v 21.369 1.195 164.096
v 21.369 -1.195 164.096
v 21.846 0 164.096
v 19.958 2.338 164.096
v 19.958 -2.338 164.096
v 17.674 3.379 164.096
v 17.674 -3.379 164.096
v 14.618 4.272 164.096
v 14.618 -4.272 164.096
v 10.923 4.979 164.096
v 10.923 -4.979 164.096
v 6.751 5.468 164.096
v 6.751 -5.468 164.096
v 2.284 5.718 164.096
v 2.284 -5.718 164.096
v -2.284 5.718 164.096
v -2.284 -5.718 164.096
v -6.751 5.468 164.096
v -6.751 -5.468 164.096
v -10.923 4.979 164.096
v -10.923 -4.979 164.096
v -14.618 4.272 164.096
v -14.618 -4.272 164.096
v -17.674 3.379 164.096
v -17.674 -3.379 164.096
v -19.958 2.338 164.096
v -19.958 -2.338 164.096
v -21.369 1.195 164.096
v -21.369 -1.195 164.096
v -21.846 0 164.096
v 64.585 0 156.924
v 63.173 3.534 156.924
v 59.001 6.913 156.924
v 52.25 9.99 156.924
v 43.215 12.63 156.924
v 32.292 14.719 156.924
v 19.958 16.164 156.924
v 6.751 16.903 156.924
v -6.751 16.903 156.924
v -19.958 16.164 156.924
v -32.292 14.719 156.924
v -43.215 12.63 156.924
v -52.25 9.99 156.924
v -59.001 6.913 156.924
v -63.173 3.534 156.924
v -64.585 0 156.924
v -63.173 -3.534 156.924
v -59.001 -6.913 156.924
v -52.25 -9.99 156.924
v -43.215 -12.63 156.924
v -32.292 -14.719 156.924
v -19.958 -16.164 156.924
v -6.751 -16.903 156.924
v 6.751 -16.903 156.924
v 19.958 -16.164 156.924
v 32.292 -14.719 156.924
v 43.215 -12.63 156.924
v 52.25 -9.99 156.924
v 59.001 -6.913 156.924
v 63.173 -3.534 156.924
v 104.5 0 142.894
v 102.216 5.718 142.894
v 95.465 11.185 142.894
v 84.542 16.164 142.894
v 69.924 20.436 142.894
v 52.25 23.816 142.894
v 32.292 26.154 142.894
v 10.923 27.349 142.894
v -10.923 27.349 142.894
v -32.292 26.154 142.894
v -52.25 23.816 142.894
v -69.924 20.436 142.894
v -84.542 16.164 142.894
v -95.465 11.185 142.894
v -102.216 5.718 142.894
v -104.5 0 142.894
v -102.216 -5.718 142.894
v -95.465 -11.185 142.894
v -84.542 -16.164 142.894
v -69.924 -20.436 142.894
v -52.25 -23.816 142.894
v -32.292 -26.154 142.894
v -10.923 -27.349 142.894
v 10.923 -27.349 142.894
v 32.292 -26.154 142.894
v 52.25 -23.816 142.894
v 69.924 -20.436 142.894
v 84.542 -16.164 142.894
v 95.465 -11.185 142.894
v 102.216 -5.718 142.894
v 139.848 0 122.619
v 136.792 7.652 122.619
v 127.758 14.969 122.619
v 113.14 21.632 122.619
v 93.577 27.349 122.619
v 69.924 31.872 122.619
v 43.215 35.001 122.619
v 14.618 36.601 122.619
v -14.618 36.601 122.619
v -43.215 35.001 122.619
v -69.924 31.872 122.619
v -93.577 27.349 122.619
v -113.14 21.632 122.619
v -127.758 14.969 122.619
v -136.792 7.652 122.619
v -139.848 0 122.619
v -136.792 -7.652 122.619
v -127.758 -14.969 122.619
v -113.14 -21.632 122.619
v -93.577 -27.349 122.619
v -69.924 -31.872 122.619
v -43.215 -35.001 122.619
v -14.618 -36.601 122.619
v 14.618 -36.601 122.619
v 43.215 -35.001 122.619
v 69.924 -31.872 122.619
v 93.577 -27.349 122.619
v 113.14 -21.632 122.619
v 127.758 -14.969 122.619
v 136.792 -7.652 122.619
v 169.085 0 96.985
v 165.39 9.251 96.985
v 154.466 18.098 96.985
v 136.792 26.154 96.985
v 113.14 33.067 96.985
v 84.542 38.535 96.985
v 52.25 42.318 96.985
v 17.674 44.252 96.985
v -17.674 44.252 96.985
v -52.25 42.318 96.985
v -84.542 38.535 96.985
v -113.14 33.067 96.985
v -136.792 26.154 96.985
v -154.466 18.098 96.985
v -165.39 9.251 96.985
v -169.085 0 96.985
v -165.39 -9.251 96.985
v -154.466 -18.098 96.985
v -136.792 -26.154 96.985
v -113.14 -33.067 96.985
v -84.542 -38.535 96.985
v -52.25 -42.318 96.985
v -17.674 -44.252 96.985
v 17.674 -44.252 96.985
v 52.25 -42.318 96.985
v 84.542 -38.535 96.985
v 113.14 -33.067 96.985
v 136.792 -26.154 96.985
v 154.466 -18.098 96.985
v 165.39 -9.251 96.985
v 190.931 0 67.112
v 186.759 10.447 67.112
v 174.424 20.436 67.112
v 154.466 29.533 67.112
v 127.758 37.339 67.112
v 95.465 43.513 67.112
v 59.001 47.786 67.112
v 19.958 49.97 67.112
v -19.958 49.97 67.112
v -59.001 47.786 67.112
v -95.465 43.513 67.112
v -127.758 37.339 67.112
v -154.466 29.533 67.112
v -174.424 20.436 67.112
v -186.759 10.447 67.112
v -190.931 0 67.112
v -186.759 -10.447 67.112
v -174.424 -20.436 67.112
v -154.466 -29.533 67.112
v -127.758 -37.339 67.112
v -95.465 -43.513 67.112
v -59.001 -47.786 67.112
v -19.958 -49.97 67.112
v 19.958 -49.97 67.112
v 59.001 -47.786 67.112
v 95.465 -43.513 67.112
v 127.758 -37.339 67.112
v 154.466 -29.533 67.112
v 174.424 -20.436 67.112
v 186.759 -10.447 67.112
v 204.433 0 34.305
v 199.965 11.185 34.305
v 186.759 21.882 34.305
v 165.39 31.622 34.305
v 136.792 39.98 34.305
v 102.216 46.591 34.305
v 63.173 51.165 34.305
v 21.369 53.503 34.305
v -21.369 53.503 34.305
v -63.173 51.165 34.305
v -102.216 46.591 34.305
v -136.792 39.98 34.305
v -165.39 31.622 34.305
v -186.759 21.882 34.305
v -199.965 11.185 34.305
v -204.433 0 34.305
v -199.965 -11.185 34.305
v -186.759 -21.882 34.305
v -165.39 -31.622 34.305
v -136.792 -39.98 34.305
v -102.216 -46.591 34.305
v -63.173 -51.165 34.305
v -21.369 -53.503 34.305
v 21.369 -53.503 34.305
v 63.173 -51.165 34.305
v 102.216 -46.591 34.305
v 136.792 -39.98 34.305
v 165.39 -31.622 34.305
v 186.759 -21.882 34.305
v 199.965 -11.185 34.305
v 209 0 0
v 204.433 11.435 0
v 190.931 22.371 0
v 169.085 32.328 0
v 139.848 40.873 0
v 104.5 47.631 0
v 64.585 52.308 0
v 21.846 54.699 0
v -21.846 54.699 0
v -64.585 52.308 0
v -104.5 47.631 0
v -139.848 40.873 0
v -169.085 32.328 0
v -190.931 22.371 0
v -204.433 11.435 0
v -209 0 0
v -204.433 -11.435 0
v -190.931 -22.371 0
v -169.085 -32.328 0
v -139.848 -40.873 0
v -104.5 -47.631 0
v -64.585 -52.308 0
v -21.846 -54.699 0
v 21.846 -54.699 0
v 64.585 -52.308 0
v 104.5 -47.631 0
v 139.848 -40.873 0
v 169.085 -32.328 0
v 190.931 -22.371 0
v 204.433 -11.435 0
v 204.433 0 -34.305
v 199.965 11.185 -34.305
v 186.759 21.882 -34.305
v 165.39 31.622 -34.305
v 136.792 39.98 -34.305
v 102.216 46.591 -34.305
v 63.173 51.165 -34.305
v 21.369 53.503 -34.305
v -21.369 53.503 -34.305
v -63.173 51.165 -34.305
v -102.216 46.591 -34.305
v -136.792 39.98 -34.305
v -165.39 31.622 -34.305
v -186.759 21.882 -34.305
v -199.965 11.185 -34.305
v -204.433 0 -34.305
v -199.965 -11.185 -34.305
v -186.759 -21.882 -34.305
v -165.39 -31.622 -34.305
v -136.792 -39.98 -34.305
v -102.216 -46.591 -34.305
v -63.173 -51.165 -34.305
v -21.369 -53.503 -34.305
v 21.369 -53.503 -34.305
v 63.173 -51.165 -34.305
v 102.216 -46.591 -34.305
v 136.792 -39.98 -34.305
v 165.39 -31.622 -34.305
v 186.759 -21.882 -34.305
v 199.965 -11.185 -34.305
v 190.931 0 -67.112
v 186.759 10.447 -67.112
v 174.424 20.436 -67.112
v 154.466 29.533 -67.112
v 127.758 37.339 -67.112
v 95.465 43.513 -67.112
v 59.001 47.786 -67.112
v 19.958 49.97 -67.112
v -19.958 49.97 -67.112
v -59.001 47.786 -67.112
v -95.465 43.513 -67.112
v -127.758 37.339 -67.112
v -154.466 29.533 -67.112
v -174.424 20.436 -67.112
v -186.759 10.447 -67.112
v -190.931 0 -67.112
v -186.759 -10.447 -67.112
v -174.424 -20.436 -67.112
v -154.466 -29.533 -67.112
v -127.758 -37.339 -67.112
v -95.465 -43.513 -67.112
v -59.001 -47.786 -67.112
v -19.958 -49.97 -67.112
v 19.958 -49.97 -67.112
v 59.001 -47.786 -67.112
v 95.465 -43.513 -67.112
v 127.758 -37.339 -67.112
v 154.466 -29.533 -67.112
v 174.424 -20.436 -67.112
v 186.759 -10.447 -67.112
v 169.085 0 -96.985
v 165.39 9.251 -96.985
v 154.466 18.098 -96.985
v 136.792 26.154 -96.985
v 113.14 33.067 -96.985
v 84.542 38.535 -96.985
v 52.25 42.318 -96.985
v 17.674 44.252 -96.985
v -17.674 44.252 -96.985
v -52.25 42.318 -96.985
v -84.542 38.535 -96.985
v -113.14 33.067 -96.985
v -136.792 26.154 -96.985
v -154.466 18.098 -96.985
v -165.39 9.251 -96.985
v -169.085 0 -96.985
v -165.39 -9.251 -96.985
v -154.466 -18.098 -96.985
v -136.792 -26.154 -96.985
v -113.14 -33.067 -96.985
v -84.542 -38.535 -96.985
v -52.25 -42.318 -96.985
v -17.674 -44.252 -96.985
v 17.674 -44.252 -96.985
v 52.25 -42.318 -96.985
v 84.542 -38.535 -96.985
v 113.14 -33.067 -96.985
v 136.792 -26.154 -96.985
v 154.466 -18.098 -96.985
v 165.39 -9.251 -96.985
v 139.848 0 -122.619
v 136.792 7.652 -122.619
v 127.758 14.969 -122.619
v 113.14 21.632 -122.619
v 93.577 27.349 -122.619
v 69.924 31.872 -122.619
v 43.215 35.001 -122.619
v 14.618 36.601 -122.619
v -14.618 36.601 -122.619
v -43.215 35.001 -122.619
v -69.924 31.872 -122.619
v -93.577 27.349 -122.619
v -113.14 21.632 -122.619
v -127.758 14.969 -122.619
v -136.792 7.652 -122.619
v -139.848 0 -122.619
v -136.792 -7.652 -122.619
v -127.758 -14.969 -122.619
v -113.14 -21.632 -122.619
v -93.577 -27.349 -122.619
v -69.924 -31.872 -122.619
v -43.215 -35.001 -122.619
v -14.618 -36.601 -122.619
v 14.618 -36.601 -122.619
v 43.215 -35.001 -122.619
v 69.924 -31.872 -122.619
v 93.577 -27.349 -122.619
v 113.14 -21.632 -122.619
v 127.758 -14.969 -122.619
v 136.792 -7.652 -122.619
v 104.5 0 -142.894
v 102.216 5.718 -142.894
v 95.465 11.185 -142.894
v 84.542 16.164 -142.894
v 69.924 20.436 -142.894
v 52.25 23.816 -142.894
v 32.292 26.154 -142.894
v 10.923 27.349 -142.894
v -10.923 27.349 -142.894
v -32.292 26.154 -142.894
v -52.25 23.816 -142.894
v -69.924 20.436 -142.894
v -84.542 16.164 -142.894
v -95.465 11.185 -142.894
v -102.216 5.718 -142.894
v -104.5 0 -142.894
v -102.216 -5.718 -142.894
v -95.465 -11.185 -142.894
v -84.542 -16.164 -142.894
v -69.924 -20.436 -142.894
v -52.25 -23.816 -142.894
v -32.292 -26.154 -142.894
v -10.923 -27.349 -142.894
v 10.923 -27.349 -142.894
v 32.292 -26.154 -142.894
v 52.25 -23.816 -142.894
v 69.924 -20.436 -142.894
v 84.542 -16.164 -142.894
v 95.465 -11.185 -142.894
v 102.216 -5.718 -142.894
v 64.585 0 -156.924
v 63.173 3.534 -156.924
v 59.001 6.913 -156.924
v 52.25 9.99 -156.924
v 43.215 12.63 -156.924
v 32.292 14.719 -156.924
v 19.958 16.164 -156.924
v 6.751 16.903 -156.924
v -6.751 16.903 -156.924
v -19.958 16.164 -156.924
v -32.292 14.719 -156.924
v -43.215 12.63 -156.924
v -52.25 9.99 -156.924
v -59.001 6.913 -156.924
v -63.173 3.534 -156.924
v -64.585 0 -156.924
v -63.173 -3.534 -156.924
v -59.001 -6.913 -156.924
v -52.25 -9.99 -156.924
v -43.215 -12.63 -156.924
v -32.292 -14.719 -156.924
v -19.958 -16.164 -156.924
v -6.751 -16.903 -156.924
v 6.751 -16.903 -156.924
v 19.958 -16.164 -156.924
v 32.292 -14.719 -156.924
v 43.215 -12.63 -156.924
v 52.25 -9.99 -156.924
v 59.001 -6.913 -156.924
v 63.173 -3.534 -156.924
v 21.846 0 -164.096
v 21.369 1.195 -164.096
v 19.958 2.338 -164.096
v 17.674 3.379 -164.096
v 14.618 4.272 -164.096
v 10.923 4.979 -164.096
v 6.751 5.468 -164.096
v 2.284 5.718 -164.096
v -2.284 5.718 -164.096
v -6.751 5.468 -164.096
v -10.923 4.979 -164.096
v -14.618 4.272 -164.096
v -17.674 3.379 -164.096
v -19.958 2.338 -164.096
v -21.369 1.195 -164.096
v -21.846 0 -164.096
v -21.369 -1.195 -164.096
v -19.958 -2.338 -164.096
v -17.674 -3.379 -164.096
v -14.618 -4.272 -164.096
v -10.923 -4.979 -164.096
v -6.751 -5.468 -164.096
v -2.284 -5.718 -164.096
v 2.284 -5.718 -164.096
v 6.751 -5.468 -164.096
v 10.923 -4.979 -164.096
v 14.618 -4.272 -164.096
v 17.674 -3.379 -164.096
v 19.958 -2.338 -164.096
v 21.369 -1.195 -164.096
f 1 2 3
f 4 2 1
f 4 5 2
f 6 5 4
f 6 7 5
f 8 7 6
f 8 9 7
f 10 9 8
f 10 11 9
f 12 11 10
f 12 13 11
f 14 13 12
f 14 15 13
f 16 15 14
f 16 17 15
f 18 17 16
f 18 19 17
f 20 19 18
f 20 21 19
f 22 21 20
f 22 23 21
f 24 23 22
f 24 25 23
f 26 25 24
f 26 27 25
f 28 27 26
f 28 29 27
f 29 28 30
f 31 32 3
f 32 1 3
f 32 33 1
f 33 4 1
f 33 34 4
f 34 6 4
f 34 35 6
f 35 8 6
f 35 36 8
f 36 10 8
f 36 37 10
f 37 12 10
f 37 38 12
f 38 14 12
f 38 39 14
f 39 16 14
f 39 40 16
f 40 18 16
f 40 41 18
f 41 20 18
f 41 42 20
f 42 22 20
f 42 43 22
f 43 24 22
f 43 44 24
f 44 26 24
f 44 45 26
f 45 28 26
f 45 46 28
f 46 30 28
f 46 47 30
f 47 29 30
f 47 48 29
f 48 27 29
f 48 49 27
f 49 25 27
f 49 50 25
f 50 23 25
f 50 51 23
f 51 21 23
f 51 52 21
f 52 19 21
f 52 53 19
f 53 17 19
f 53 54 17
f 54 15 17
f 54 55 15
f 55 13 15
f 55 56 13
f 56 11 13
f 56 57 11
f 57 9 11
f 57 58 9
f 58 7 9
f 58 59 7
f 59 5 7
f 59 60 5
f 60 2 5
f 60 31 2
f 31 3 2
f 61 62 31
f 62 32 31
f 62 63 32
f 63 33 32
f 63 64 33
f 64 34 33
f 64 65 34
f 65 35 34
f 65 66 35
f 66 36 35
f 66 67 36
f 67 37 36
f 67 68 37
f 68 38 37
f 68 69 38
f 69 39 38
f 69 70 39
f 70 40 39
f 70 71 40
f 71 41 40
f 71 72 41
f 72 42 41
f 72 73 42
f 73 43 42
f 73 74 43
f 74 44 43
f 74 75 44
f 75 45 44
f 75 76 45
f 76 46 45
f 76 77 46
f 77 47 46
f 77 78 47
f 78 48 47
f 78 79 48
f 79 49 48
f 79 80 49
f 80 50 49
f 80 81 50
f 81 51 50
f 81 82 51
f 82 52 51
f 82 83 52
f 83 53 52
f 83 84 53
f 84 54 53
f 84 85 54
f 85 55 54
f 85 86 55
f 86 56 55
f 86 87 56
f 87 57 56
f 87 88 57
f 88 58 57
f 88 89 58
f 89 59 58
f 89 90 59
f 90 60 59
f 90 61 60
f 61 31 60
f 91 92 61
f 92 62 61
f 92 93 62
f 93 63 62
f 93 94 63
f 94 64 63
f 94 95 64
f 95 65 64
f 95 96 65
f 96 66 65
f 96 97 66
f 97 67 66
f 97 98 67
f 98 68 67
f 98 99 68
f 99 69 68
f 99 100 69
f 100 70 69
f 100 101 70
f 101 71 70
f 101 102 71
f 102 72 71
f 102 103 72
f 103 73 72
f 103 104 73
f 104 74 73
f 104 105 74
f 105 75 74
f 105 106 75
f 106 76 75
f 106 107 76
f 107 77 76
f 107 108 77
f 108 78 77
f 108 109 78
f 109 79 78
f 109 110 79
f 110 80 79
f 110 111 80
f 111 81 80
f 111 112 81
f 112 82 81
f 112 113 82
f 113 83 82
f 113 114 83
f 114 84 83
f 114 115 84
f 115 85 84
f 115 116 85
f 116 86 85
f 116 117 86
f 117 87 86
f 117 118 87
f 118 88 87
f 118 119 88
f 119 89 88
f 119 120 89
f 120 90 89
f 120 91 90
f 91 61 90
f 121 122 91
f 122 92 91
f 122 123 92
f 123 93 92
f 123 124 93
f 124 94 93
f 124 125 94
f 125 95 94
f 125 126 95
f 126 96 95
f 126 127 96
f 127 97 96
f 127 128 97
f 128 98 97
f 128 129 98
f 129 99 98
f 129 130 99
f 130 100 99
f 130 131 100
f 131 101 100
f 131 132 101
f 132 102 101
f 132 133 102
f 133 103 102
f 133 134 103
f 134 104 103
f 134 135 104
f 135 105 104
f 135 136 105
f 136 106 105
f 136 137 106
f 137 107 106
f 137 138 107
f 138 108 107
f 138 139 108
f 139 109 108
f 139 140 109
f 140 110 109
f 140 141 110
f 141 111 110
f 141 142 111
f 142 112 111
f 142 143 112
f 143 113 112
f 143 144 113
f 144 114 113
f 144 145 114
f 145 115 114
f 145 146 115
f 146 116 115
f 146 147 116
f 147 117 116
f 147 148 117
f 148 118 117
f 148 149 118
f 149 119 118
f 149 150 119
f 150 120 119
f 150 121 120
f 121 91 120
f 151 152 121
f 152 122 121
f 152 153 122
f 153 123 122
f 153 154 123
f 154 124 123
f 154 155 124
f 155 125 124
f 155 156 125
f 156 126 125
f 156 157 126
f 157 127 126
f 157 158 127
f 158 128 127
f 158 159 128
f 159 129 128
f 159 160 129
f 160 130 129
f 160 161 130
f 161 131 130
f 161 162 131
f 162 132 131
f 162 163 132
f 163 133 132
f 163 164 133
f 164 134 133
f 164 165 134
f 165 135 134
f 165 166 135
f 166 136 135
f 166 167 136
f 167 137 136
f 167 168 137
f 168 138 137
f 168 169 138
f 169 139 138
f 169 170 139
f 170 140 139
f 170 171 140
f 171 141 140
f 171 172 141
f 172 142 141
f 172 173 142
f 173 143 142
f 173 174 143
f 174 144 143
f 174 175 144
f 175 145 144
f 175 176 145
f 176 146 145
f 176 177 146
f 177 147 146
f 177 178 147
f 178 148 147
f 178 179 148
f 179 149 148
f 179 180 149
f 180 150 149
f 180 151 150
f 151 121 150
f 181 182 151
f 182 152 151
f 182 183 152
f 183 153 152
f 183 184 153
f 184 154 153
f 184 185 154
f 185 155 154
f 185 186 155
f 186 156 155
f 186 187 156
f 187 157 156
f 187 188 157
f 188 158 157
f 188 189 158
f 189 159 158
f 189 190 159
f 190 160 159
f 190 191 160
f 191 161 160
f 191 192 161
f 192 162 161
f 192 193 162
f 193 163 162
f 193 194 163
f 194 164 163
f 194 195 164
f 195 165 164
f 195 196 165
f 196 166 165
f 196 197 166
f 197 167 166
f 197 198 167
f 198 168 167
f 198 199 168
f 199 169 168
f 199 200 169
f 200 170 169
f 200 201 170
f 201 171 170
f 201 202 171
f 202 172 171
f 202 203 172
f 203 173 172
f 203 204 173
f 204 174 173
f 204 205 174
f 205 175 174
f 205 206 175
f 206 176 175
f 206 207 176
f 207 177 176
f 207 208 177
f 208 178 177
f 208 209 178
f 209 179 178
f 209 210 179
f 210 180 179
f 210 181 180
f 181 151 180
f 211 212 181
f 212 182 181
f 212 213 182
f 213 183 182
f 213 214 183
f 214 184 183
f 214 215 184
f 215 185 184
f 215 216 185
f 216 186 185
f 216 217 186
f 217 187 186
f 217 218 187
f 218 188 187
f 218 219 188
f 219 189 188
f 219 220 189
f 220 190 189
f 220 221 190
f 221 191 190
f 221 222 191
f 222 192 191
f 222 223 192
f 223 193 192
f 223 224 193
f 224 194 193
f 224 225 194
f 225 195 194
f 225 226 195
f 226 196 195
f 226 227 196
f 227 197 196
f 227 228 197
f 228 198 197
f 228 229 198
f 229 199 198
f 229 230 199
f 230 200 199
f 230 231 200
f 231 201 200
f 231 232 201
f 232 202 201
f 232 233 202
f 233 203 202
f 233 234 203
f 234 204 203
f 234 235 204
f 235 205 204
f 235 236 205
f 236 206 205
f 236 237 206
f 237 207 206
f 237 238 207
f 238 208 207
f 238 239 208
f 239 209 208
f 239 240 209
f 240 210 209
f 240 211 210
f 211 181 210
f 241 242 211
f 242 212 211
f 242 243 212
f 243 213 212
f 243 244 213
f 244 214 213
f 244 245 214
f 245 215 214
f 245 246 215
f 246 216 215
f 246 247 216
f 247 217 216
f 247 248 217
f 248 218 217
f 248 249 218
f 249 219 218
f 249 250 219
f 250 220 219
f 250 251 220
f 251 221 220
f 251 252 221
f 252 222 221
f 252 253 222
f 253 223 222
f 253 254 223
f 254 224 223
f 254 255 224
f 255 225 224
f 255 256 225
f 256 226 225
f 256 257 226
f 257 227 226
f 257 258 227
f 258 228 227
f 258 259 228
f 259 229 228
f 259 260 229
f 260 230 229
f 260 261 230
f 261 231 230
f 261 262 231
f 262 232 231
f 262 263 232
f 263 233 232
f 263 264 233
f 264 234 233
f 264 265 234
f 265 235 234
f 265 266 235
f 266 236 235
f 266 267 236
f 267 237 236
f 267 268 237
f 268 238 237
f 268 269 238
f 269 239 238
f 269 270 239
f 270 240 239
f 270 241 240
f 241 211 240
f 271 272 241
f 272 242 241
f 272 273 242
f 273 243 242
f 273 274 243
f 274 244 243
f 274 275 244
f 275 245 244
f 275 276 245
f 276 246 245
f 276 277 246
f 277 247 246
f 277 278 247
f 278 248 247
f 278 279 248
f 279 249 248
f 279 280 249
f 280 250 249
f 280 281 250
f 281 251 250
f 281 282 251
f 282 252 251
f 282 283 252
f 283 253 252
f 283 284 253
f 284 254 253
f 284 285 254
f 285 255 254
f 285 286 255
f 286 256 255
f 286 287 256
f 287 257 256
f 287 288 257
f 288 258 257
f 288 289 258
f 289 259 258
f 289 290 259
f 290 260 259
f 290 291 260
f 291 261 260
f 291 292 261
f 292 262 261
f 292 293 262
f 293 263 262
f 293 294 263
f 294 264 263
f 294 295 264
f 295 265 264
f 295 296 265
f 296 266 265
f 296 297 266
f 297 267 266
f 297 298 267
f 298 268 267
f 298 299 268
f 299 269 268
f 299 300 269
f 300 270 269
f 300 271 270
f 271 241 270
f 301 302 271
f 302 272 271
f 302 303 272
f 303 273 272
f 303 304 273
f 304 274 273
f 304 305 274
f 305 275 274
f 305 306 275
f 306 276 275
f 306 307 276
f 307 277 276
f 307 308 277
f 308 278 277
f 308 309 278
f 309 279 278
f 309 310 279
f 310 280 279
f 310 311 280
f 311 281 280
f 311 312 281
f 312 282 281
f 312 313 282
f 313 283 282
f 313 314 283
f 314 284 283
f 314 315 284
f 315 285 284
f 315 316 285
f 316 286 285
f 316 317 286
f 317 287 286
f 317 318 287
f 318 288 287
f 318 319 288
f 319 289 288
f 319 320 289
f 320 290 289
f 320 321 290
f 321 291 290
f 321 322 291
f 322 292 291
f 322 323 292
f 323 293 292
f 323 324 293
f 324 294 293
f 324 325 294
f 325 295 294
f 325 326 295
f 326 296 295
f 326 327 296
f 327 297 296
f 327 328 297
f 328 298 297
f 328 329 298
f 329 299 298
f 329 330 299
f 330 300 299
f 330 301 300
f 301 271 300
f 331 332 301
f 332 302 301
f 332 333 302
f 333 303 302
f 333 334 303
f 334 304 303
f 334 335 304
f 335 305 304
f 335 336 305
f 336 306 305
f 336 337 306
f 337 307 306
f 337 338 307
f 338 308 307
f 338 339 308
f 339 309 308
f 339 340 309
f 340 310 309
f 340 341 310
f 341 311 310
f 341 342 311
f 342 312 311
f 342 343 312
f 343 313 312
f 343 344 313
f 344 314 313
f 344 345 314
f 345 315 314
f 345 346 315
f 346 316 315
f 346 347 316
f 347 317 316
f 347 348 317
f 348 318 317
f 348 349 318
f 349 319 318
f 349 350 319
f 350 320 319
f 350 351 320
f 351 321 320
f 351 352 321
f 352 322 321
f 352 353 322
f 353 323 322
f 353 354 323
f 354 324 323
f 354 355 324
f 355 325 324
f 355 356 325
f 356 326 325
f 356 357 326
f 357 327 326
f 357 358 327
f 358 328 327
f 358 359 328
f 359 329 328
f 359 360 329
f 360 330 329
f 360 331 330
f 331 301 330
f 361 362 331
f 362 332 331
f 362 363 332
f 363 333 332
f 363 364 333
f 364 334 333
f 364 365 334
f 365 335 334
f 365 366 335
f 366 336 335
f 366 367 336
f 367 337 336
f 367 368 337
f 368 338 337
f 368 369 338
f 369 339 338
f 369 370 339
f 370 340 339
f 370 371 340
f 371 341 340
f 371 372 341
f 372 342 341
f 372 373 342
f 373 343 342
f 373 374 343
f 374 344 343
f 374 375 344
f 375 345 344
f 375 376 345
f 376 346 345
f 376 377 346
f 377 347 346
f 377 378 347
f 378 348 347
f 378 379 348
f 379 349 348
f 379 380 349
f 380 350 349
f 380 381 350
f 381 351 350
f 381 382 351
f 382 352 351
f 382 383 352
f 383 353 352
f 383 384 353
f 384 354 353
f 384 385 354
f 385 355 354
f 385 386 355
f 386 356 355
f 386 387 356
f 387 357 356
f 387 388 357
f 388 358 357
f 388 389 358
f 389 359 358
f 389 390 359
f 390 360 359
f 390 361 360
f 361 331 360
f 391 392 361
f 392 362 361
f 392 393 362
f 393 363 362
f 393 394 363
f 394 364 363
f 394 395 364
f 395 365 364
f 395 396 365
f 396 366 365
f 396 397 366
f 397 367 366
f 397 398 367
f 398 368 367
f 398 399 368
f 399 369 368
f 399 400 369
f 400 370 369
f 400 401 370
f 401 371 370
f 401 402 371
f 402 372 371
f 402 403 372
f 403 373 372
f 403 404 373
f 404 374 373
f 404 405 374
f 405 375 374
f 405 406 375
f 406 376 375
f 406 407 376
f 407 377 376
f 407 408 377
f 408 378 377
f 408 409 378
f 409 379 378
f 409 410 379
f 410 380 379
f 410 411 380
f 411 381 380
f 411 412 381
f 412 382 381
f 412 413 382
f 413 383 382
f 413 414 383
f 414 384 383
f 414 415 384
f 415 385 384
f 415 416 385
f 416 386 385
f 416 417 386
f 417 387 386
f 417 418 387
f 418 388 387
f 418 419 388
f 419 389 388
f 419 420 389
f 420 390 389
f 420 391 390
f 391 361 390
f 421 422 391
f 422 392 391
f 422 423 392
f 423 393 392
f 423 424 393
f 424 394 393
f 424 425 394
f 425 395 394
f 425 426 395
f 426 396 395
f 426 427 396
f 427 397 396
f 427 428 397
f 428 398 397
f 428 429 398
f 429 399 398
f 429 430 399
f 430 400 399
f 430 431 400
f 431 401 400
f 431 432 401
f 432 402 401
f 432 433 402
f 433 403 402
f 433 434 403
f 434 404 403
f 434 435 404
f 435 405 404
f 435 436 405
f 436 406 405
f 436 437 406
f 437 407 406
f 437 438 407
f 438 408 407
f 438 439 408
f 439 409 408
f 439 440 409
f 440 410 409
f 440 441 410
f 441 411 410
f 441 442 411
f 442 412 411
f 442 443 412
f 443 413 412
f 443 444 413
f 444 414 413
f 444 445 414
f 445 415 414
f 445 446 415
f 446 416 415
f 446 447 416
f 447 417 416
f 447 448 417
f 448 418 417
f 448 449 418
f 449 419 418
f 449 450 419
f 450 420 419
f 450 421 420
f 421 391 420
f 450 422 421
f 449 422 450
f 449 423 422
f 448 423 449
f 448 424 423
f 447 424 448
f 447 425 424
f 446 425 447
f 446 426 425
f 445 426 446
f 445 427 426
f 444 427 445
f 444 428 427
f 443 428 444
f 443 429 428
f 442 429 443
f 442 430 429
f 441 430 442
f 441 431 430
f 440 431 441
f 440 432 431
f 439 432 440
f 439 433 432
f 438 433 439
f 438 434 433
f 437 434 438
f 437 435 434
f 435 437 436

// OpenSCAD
// Generated by SolidPython 1.0.1 on 2020-07-29 00:46:53


scale(v = [19, 5, 15]) {
	sphere(r = 11);
}
/***********************************************
*********      SolidPython code:      **********
************************************************
 
# import packages: SolidPython
from solid import *
from solid.utils import *
from itertools import chain, combinations, permutations


class Resize:

    def __init__(self, scad_file):
        self.scad_file = scad_file
        #self.scad_file = import_scad(scad_file)
        # cone/cylinder param:
        self.r1 = 0
        self.r2 = 0
        self.h = 0
        # rectangular prism param:
        self.w = 0
        self.l = 0
        # ellipse param:
        self.r = 0

    # import OpenScad code (file name corresponds to shape)


    # classify shape + parameters
    def assign(self, param1, param2, param3):
        if self.scad_file == 'cone.scad':
            self.r1 = param1
            self.r2 = param2
            self.h = param3
        elif self.scad_file == 'cylinder.scad':
            self.r1 = param1
            self.r2 = param2
            self.h = param3
        elif self.scad_file == 'rectangularPrism.scad':
            self.h = param1
            self.l = param2
            self.w = param3
        else:
            self.r = param1
            self.h = param2

    # resize parameters
    def iterate(self):
        x = range(3, 20, 2)
        i = 1
        if self.scad_file == 'cone.scad':
            tempList = list(permutations(x, 2))
            for temp in tempList:
                param1 = temp[0]
                param2 = temp[1]
                filepath = 'produced_scad_files/' + 'cone' + str(param1) + '_' + str(param2) + '_' + '.scad'
                scad_render_to_file(cylinder(h=param1, r1=param2, r2=0), filepath)

        elif self.scad_file == 'cylinder.scad':
            tempList = list(permutations(x, 3))
            for temp in tempList:
                param1 = temp[0]
                param2 = temp[1]
                filepath = 'produced_scad_files/' + 'cylinder' + str(param1) + '_' + str(param2) + '_' + '.scad'
                scad_render_to_file(cylinder(h=param1, r1=param2, r2=param2), filepath)

        elif self.scad_file == 'rectangularPrism.scad':
            tempList = list(permutations(x, 3))
            for temp in tempList:
                param1 = temp[0]
                param2 = temp[1]
                param3 = temp[2]
                filepath = 'produced_scad_files/' + 'rectangularPrism' + str(param1) + '_' + str(param2) + '_' + str(
                    param3) + '.scad'
                scad_render_to_file(cube(size=(param1, param2, param3)), filepath)

        elif self.scad_file == 'ellipse.scad':
            tempList = list(permutations(x, 4))
            for temp in tempList:
                param1 = temp[0]
                param2 = temp[1]
                param3 = temp[2]
                param4 = temp[3]
                filepath = 'produced_scad_files/' + 'ellipse' + str(param1) + '_' + str(param2) + '_' + str(param3) + '_' + str(param4) + '.scad'
                scad_render_to_file(scale([param1, param2, param3])(sphere(r=param4)), filepath)

    def render_to_scadfile(self):
        scad_render_to_file(scad, 'example.scad') 
 
************************************************/
